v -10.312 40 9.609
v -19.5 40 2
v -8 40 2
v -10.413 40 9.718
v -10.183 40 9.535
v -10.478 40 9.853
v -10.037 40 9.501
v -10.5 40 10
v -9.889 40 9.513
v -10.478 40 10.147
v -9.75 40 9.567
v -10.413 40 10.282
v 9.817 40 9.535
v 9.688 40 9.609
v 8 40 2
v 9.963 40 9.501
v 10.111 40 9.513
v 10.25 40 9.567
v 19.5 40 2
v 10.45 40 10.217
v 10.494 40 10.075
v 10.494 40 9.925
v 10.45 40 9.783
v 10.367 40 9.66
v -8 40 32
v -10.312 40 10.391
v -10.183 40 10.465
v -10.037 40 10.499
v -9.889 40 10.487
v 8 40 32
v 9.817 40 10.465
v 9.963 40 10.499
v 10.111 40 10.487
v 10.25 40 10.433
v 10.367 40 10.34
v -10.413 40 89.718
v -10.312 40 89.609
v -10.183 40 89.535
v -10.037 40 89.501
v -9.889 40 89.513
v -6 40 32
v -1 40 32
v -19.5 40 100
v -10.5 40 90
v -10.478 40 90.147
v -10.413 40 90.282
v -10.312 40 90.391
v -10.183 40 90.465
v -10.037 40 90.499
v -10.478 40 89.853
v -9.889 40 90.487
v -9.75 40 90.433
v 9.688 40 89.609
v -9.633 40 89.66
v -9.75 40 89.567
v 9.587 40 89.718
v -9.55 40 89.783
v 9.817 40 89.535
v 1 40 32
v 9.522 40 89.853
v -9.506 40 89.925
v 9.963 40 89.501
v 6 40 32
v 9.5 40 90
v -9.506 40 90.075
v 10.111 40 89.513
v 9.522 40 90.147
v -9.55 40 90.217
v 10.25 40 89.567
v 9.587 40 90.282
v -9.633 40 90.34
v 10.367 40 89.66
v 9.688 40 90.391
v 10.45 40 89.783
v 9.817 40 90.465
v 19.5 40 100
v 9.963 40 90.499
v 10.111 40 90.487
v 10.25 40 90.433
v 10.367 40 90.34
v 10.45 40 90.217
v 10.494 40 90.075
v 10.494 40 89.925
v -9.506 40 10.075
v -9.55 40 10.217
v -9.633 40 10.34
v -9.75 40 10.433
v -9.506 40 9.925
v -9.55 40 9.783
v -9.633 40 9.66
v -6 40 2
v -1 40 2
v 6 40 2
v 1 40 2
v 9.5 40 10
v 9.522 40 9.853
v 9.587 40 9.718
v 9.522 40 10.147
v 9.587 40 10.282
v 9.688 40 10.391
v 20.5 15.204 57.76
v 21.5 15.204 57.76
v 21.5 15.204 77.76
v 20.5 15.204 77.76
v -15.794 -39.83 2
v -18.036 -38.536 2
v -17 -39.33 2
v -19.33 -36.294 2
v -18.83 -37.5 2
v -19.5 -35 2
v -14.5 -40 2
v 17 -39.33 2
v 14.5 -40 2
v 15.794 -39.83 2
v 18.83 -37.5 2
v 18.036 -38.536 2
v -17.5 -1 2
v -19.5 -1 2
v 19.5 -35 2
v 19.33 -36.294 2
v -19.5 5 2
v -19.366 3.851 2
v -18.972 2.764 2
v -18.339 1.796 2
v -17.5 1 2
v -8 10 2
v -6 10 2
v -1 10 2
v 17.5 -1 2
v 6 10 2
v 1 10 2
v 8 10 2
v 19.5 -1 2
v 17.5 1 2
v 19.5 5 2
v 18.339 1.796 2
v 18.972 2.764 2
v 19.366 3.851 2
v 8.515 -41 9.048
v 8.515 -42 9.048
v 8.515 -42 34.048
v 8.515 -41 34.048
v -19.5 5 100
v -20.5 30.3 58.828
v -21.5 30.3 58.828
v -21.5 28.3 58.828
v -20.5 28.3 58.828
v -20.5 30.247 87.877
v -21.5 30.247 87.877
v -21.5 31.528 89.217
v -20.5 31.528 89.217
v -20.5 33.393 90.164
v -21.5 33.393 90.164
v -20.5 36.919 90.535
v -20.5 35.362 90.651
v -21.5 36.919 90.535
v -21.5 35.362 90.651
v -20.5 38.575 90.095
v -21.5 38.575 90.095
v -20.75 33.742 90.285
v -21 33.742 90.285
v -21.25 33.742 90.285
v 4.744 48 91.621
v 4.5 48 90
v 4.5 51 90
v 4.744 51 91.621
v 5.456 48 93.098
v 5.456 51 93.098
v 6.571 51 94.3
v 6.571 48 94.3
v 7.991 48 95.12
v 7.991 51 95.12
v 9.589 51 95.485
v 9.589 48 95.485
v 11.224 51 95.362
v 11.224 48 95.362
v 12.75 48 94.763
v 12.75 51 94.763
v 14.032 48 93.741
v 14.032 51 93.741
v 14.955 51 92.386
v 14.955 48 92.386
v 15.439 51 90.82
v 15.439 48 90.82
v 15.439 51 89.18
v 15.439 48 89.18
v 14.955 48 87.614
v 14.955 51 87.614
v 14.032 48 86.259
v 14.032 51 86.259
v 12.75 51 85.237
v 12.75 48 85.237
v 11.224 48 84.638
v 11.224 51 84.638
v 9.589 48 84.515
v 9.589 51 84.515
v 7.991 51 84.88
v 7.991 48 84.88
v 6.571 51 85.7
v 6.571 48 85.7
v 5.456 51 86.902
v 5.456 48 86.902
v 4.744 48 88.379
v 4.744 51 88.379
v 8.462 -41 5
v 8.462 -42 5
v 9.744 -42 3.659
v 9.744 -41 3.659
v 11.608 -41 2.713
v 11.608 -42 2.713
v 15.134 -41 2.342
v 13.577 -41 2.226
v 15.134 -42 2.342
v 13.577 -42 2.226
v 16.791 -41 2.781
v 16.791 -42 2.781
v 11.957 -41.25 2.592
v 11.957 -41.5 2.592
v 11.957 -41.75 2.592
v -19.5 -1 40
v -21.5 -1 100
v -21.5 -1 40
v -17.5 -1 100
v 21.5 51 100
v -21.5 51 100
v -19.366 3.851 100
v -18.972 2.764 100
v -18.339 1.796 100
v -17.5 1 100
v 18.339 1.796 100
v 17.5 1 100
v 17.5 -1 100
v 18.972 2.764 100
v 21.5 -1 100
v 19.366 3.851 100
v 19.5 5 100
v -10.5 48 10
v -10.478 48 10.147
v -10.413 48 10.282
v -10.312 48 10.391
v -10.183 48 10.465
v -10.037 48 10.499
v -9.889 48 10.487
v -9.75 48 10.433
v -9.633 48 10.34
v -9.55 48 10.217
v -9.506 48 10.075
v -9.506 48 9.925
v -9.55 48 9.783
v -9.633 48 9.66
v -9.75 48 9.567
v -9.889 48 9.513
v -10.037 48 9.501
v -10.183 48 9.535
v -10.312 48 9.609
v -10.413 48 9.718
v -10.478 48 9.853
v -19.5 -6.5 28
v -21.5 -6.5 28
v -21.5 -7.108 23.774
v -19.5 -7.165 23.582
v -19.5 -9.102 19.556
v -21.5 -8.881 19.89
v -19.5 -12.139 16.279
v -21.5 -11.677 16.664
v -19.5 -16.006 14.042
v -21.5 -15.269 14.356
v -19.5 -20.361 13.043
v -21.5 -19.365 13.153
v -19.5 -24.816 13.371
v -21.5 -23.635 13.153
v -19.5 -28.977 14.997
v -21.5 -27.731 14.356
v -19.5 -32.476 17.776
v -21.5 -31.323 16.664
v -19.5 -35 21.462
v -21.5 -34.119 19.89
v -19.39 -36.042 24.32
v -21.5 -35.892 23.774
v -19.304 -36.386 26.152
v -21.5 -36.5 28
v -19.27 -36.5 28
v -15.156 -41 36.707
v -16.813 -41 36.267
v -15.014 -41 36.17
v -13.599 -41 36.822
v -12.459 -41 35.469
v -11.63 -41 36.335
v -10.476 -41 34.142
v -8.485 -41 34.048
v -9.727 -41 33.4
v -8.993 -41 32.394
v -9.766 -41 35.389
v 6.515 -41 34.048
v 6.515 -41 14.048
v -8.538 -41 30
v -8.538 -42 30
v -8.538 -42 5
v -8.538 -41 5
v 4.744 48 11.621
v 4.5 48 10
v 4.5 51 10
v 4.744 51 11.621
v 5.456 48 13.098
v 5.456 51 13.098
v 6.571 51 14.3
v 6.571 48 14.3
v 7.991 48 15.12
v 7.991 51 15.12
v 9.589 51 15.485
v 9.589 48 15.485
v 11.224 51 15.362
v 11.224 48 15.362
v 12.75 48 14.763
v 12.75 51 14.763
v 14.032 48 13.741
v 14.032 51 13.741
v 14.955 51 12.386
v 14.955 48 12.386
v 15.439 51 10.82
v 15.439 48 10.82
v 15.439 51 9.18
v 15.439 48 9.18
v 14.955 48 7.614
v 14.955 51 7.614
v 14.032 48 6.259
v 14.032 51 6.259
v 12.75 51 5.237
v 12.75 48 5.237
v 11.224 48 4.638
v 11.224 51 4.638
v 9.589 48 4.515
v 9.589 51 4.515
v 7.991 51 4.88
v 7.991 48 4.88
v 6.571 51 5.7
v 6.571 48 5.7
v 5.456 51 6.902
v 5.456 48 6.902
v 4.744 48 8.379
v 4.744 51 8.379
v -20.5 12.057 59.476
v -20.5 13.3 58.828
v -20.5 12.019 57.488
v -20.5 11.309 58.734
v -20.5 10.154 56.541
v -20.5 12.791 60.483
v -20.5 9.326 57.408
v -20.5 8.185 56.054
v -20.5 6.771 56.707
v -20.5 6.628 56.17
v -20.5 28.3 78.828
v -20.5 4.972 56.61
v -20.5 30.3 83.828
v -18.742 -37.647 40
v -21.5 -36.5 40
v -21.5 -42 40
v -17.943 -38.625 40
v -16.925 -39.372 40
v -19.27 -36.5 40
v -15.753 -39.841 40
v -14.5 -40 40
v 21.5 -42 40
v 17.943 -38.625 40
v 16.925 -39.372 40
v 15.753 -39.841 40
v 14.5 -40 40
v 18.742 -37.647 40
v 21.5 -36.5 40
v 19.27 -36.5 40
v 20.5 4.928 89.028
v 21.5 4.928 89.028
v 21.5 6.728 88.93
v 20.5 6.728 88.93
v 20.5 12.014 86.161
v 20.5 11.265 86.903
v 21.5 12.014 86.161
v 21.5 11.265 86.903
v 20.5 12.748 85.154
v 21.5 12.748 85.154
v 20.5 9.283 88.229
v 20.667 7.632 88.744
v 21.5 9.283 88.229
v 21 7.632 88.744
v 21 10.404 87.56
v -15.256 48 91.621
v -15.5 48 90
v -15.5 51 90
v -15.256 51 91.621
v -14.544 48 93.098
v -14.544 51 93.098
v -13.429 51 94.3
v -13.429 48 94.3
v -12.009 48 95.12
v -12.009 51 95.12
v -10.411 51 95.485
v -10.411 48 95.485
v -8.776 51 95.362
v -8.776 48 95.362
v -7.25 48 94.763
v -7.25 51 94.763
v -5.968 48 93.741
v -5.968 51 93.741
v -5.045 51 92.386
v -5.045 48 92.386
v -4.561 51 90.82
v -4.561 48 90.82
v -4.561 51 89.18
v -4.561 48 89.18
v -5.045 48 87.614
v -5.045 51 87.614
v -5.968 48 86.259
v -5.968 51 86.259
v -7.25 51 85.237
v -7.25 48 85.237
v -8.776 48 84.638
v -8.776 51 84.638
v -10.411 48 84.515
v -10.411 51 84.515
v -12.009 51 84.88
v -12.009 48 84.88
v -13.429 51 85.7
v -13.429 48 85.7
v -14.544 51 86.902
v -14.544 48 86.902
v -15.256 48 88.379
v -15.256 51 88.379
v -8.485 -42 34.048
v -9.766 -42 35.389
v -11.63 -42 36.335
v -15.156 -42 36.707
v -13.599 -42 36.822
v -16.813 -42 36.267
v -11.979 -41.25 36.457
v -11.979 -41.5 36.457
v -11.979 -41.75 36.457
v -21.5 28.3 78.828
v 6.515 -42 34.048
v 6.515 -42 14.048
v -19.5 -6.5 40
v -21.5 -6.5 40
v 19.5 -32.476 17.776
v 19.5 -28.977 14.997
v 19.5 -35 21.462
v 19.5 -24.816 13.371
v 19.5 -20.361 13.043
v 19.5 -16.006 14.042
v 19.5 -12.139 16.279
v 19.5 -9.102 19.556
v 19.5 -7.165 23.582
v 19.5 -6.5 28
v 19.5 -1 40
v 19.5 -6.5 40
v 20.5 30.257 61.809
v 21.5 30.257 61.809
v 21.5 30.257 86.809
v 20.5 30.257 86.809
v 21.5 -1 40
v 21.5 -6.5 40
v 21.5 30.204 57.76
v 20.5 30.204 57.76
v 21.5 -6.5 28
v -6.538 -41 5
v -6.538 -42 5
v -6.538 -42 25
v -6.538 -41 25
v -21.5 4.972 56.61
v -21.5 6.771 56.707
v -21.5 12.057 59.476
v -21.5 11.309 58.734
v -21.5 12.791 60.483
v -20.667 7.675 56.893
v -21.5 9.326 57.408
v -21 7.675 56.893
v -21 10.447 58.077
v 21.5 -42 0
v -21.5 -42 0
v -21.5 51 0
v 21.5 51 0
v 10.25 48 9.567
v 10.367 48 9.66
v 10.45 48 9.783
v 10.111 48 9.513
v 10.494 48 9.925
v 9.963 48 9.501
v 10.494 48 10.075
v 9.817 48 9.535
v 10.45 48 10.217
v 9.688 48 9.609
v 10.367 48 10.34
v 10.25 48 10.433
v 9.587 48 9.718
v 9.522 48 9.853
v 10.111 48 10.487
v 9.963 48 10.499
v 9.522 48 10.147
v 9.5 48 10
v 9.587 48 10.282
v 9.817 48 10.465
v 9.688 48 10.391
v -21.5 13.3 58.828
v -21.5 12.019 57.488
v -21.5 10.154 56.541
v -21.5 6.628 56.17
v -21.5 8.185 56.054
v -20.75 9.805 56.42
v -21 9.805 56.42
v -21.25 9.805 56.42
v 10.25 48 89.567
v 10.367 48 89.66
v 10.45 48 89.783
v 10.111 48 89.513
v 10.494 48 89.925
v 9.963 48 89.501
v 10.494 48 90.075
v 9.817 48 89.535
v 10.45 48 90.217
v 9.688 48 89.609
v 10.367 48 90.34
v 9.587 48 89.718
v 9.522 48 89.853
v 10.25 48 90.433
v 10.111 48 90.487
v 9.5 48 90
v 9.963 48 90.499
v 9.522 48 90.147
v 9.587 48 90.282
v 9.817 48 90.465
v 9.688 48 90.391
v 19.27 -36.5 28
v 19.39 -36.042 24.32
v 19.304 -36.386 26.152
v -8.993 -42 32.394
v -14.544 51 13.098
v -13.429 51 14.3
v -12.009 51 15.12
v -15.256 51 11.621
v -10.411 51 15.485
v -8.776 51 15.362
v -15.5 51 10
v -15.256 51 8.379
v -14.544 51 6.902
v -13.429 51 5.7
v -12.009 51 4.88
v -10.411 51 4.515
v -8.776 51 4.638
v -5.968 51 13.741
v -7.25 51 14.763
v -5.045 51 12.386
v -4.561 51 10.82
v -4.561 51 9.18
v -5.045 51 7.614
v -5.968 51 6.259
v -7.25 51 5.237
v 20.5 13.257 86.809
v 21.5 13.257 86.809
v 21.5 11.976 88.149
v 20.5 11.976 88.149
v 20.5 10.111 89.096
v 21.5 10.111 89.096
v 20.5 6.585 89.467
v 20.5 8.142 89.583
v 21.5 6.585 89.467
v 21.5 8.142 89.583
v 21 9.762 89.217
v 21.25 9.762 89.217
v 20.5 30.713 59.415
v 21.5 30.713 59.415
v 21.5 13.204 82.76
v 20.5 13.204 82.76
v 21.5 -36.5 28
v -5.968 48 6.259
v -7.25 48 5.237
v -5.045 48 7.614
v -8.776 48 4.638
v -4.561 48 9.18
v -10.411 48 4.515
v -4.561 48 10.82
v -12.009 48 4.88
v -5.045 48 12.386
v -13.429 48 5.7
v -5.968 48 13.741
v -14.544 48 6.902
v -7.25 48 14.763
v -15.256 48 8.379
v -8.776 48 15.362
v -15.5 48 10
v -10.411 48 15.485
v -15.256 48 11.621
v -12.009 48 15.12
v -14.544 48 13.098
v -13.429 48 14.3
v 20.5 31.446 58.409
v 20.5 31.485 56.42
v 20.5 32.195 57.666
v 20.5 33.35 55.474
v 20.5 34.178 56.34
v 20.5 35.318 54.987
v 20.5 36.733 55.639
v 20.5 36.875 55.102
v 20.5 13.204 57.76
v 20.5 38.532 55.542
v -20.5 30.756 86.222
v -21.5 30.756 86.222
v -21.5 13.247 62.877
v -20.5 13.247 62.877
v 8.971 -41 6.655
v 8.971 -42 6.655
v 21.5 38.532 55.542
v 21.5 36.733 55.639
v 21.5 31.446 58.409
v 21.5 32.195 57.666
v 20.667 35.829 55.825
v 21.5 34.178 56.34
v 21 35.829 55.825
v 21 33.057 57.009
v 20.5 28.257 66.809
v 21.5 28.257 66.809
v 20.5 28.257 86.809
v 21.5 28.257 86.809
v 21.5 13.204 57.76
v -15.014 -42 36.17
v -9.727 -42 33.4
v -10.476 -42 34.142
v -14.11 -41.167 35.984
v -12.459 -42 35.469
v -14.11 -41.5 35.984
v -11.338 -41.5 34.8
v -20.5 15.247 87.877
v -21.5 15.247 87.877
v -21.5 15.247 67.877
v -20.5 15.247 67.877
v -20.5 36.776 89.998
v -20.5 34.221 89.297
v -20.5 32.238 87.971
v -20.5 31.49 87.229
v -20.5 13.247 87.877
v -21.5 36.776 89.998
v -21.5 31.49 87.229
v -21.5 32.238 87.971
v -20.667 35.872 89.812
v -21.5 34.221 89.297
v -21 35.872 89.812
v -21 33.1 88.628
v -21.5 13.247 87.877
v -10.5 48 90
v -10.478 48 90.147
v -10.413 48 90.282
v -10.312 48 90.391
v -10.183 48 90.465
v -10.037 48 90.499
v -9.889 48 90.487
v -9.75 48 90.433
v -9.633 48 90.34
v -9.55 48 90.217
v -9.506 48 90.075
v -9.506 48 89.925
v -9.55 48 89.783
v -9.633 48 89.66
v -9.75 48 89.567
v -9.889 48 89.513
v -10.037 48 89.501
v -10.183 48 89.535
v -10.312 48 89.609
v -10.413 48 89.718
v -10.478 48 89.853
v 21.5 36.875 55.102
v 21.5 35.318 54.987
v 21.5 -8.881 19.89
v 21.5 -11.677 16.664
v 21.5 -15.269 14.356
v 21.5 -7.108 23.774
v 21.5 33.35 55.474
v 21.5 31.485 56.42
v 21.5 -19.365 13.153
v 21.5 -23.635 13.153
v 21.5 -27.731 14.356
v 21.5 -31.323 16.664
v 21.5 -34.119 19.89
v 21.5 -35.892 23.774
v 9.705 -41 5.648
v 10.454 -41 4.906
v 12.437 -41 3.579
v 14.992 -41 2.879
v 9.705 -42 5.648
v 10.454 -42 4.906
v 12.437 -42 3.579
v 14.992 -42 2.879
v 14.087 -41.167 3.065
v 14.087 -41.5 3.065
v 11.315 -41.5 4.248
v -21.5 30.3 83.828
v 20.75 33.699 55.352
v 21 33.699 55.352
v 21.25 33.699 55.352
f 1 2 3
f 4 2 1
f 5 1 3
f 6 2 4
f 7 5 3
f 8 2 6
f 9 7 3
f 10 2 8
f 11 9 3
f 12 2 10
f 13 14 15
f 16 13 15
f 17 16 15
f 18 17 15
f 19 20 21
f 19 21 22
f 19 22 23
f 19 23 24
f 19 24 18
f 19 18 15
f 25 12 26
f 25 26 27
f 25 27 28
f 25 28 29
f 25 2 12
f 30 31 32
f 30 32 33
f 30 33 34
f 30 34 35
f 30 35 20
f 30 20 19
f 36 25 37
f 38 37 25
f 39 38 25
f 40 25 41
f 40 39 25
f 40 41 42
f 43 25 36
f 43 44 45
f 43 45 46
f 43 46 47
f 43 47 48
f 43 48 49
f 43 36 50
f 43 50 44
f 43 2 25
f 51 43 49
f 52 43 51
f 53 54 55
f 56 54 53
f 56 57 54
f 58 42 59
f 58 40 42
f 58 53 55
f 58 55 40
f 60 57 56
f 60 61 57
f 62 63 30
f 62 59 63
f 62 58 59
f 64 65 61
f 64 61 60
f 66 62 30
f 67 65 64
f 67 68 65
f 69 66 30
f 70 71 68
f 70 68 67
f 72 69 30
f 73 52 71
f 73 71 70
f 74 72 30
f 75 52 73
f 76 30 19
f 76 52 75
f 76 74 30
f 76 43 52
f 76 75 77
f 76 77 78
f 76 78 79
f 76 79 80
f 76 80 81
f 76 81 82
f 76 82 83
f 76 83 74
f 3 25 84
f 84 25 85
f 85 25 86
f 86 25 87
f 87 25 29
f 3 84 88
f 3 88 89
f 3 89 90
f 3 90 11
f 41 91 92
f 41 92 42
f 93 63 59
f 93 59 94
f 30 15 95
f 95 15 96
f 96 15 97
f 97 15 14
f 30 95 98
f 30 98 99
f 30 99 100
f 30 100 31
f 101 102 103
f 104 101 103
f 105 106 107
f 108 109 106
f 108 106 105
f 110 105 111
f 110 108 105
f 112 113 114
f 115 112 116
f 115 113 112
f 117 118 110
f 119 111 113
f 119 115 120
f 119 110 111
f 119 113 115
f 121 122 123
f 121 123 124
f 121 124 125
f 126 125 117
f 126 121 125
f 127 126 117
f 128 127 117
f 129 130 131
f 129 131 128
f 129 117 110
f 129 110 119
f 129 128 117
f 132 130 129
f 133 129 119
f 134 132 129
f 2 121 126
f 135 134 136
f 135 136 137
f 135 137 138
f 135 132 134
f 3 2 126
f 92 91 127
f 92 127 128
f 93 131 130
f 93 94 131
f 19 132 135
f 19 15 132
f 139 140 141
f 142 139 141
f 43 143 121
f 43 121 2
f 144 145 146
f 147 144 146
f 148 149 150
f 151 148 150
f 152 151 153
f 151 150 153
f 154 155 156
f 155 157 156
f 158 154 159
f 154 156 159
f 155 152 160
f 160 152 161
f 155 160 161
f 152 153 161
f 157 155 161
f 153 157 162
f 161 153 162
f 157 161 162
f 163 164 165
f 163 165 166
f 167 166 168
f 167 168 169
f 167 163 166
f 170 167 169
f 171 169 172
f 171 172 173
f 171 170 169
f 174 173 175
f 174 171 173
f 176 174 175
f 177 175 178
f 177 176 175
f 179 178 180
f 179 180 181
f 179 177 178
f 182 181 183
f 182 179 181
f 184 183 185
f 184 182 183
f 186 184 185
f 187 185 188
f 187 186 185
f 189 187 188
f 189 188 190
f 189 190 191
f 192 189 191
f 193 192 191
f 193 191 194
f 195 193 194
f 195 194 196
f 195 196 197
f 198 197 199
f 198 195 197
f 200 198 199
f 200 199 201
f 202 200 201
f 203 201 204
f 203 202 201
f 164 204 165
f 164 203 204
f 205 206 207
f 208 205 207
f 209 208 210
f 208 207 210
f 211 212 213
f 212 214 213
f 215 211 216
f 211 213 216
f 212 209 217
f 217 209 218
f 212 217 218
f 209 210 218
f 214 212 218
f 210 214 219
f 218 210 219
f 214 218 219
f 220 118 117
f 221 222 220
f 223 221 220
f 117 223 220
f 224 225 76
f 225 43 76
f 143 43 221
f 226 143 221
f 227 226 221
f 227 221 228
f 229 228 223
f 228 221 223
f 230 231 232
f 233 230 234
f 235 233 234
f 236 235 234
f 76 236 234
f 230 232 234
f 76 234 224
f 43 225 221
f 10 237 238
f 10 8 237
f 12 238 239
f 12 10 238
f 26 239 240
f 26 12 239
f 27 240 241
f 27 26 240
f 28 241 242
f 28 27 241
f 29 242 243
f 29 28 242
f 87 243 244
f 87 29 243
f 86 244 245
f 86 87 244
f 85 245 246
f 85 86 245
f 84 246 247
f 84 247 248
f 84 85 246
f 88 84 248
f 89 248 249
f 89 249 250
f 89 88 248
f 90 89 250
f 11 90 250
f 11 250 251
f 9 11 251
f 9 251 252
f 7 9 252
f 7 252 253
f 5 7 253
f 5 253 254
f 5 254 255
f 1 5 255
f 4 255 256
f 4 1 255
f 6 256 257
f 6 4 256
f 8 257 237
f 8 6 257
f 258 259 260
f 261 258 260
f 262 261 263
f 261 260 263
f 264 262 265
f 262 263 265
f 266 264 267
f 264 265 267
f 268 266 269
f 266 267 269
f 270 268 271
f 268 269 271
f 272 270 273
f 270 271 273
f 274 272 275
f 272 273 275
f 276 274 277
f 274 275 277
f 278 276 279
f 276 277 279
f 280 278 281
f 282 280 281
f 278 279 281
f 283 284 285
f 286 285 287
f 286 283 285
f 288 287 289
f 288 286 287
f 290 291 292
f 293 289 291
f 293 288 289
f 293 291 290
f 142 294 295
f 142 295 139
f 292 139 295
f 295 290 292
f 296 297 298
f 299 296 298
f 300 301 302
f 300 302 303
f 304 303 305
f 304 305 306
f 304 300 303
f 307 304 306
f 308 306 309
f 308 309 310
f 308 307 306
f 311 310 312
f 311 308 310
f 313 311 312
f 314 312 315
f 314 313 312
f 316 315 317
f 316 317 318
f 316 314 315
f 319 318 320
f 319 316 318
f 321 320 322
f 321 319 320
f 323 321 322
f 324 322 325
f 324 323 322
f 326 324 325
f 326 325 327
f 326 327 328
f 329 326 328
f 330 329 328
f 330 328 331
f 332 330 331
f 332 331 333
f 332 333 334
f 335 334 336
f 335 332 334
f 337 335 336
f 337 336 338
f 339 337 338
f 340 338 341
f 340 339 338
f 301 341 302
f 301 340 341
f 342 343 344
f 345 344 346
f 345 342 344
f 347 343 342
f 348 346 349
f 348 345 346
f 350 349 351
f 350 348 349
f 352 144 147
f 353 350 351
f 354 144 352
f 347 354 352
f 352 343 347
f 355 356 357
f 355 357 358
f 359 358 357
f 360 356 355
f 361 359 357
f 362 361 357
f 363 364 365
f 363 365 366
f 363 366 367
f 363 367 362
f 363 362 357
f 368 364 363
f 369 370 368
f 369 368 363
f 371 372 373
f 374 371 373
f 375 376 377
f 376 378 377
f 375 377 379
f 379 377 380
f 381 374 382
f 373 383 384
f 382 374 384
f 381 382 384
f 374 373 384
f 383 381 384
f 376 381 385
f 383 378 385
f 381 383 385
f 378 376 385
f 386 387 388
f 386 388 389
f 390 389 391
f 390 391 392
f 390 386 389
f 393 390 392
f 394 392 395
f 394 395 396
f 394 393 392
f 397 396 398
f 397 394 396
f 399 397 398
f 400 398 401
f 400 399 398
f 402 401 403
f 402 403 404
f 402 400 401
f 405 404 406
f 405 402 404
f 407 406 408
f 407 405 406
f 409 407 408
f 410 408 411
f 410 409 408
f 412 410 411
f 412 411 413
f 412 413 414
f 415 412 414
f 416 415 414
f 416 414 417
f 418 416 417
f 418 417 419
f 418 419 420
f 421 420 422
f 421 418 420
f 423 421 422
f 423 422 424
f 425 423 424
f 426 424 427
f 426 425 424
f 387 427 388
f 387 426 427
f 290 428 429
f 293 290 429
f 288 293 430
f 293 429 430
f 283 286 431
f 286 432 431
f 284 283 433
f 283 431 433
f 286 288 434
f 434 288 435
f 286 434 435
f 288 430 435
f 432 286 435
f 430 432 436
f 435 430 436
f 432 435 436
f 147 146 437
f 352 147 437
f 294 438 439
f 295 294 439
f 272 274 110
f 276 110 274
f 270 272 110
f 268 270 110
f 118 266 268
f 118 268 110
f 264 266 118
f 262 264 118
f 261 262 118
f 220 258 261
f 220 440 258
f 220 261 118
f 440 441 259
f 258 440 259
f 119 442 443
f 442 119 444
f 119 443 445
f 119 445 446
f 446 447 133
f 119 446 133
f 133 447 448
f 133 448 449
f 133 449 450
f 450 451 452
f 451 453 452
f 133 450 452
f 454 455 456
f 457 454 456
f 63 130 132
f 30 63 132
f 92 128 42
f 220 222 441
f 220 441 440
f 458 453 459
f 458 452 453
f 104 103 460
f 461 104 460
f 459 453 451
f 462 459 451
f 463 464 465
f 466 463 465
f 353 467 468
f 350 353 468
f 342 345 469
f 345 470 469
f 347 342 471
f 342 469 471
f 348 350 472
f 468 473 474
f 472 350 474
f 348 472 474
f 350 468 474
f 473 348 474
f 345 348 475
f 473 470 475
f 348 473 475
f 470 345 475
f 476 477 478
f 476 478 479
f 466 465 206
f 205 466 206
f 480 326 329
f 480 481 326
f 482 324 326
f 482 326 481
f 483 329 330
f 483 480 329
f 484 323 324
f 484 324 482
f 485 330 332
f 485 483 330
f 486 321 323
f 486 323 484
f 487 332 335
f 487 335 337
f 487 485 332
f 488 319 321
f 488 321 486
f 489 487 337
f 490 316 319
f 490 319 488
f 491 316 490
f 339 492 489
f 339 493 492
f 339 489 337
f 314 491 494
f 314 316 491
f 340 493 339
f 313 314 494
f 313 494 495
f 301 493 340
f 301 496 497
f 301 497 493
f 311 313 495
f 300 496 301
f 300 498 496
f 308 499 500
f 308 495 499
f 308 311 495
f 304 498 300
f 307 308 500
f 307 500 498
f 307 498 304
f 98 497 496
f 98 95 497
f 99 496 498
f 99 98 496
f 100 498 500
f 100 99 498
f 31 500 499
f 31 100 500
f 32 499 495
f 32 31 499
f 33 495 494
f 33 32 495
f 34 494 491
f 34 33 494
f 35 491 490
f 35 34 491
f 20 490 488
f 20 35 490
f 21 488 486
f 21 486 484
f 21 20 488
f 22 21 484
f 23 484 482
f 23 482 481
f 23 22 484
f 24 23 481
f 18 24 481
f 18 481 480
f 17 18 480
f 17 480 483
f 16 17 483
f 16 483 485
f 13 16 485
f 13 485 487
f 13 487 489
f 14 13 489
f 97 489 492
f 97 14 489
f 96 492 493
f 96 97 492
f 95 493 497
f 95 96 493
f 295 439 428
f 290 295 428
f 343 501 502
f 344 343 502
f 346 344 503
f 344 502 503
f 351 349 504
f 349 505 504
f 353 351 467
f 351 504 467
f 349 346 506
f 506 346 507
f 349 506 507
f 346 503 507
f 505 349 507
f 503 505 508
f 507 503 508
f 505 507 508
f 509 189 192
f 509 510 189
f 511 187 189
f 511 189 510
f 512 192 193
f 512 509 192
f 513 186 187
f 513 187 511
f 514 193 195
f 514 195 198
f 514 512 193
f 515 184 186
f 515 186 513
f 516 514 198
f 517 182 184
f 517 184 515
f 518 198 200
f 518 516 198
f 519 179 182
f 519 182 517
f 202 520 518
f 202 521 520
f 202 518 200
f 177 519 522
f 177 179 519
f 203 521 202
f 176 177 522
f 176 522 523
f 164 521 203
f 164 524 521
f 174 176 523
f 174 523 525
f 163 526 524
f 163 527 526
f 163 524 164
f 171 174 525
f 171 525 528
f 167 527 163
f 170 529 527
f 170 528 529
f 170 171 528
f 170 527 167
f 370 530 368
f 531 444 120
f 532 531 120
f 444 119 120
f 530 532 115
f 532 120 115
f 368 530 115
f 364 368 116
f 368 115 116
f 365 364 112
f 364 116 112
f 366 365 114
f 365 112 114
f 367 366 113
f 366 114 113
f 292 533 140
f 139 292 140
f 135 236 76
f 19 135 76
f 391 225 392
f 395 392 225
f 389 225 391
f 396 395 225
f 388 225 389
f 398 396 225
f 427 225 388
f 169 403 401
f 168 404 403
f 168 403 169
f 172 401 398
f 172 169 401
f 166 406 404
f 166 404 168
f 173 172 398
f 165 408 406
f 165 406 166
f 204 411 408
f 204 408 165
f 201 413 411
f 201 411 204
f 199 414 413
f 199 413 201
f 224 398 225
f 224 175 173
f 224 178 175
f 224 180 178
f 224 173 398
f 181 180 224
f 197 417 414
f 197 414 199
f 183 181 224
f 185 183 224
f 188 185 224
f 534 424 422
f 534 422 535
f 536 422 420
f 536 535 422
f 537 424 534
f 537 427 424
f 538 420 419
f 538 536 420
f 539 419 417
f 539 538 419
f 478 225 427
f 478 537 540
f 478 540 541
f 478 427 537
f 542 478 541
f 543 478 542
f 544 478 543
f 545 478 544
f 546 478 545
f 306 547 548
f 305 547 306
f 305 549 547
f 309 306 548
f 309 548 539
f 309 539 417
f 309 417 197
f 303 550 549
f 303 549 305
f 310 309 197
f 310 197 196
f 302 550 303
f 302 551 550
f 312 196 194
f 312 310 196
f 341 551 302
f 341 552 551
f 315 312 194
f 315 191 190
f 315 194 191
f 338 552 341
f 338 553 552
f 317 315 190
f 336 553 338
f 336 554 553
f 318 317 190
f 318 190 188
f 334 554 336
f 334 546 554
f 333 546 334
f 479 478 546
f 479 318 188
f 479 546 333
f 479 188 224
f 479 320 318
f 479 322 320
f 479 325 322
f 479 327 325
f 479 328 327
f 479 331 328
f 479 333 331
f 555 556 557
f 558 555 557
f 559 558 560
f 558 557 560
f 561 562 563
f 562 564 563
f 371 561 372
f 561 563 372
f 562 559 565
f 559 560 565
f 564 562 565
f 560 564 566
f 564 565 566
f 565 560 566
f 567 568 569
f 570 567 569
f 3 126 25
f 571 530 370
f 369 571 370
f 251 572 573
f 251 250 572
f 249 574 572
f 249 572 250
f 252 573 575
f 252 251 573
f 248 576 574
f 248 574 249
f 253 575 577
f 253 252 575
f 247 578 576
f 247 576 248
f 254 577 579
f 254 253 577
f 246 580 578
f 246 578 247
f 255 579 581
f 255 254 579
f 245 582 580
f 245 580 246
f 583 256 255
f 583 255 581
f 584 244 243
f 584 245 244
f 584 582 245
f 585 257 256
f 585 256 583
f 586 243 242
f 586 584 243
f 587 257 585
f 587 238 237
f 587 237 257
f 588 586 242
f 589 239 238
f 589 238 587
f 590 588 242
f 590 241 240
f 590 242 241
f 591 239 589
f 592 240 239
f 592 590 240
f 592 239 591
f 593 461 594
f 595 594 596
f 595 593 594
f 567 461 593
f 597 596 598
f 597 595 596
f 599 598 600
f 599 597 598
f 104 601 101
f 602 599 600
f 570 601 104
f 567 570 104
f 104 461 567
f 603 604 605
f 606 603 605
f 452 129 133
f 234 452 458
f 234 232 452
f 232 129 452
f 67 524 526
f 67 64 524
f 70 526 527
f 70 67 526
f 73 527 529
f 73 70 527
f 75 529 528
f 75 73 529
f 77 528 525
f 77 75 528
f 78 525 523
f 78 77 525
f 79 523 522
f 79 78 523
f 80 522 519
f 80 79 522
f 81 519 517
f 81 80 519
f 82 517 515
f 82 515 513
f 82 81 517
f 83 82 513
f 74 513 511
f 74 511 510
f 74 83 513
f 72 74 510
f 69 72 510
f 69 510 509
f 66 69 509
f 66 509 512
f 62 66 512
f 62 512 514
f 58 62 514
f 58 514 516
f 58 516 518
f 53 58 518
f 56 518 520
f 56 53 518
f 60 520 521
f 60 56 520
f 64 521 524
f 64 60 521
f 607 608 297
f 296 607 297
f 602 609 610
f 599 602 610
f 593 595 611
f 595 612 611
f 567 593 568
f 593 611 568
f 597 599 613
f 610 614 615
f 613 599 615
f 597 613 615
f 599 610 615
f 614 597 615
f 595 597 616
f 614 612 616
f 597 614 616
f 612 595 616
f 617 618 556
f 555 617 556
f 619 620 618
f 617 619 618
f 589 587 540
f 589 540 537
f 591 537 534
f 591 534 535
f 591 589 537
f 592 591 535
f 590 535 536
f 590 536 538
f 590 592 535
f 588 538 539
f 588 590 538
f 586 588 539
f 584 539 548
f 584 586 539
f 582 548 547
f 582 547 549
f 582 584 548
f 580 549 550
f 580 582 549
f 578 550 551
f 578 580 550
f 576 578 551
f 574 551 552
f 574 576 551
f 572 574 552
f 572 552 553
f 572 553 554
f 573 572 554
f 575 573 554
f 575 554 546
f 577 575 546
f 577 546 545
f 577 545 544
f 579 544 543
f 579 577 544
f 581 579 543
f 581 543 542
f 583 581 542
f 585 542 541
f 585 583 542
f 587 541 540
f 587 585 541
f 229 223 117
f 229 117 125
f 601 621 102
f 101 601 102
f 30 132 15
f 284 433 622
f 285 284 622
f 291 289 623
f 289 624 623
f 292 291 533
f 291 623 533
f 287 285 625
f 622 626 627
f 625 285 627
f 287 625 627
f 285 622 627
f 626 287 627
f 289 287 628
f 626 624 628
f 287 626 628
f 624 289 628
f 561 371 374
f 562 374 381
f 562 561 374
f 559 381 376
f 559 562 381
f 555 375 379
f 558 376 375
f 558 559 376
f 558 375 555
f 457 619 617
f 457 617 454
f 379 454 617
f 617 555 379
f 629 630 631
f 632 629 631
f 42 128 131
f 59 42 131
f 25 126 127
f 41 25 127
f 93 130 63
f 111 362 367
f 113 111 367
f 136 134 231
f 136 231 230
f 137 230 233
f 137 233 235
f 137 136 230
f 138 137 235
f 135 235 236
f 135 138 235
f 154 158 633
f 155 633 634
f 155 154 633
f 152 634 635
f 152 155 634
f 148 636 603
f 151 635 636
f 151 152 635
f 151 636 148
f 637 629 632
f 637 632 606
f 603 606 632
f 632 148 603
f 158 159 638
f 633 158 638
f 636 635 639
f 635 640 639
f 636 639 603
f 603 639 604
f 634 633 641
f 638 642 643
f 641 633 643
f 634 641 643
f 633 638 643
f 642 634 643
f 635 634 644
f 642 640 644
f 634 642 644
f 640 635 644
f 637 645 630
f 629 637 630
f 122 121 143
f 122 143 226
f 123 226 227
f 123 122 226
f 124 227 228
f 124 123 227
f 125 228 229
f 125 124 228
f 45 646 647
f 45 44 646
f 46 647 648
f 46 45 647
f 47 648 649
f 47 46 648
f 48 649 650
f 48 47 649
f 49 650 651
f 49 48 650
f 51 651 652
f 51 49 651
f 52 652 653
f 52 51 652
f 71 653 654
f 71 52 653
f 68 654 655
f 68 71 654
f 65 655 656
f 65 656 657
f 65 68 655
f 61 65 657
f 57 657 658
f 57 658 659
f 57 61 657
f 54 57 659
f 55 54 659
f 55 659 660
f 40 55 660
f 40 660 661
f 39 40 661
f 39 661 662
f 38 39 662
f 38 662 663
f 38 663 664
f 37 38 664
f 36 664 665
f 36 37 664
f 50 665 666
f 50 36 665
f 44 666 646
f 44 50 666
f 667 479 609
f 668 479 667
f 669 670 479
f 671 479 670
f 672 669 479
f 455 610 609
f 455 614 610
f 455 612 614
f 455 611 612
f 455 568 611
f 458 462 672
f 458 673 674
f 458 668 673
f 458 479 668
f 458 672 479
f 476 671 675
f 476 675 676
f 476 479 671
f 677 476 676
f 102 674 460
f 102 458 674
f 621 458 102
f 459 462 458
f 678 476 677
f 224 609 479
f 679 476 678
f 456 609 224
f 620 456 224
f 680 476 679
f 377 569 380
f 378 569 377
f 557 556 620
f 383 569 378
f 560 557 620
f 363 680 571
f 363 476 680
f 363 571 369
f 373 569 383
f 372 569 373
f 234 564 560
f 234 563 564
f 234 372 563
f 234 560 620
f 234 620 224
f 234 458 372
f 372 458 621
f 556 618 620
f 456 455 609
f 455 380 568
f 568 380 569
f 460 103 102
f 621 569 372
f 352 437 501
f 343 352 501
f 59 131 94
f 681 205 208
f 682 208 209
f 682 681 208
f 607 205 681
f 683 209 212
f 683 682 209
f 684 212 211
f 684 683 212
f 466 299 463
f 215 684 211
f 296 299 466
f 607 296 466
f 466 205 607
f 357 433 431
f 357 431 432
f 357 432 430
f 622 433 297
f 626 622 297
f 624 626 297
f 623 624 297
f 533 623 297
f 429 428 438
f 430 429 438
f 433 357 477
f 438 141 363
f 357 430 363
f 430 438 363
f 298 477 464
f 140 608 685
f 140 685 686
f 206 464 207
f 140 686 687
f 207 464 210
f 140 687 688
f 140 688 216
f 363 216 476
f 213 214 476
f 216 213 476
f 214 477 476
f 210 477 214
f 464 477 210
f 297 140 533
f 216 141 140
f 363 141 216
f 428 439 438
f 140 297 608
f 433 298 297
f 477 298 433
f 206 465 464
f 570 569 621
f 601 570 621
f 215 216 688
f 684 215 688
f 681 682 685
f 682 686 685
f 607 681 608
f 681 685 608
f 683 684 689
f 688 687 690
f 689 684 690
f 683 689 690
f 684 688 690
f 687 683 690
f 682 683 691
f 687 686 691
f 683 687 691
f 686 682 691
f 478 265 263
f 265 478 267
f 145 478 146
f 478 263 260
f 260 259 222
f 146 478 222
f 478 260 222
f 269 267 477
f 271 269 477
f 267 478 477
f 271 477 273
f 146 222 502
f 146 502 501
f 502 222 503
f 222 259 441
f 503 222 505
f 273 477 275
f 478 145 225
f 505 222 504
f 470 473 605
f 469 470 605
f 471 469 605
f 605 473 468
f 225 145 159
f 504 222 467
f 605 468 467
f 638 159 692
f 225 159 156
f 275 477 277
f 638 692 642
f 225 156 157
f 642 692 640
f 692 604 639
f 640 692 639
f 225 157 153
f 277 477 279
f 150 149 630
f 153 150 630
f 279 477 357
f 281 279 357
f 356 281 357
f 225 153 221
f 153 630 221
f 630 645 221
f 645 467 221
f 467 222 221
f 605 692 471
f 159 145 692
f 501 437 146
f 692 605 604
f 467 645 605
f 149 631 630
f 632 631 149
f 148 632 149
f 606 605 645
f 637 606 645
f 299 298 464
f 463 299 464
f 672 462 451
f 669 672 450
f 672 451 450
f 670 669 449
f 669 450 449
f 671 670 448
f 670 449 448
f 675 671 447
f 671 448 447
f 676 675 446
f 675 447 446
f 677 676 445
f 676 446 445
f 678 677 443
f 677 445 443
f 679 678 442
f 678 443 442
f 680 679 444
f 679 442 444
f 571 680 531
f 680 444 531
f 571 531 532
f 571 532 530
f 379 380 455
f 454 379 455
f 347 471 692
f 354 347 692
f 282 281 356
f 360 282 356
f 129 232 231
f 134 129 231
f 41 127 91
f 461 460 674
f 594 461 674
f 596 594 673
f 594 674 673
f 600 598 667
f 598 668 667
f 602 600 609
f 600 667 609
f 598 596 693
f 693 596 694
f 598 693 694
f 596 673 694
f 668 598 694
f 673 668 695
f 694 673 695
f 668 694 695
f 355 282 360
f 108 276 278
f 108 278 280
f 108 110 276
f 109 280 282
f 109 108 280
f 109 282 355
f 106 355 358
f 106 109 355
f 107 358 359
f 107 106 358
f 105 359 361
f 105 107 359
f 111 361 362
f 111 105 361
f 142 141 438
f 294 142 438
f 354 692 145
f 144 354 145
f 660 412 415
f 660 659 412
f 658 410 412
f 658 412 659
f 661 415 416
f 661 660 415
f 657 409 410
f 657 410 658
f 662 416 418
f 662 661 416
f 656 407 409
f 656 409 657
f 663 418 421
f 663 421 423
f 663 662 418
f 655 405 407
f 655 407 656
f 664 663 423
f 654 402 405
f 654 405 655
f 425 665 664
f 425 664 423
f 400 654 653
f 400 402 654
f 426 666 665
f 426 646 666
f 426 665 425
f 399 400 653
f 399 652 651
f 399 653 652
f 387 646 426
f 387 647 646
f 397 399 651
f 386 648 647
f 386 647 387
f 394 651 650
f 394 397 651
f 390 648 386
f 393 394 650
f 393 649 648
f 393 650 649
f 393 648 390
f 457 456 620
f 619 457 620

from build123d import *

# Parameters (mm, degrees)
F0_W         = 43
F0_H         = 84
F1_DEPTH     = 100
F2_W         = 43
F2_H         = 41
F3_DEPTH     = 60
F4_W         = 39
F4_H         = 39
F5_DEPTH     = 38
F6_W         = 39
F6_H         = 39
F7_DEPTH     = 98
F8_W         = 35
F8_H         = 2
F9_DEPTH     = 98
F10_T1_DEPTH = 98
F12_DEPTH    = 43
F13_R        = 5
F14_DEPTH    = 3
F15_R        = 5.5
F16_DEPTH    = 3
F17_W        = 2
F17_H        = 30
F18_DEPTH    = 30
F19_SIZE     = 29.99999
F21_DEPTH    = 1
F23_DEPTH    = 1
F25_DEPTH    = 1
F26_R        = 0.5
F27_DEPTH    = 2
F28_R        = 0.5
F29_DEPTH    = 2
F30_DEPTH    = 6
F31_DEPTH    = 6
F32_DEPTH    = 6
F33_R        = 0.5
F34_DEPTH    = 2
F35_R        = 0.5
F36_DEPTH    = 2
F37_DEPTH    = 6
F38_DEPTH    = 6


# Not quite as in the source:
# - a fillet or chamfer that OpenCascade refuses, or shapes differently, is made with other operations: its cross-section is extruded or revolved along the edge and cut away or added
# - a fillet or chamfer is up to 0.001 mm smaller than in the source, because OpenCascade refuses the exact size


with BuildPart() as f1:
    # F0 (on Top) → F1 (new body)
    with BuildSketch(Plane.XY):
        Rectangle(F0_W, F0_H)
    extrude(amount=F1_DEPTH)

    # F2 (on face) → F3 (cut)
    with BuildSketch(Plane.XY.offset(100)):
        with Locations((0, -21.5)):
            Rectangle(F2_W, F2_H)
    extrude(amount=-F3_DEPTH, mode=Mode.SUBTRACT)

    # F4 (on face) → F5 (cut)
    with BuildSketch(Plane.XY.offset(40)):
        with Locations((0, -20.5)):
            Rectangle(F4_W, F4_H)
    extrude(amount=-F5_DEPTH, mode=Mode.SUBTRACT)

    # F6 (on face) → F7 (cut)
    with BuildSketch(Plane.XY.offset(100)):
        with Locations((0, 20.5)):
            Rectangle(F6_W, F6_H)
    extrude(amount=-F7_DEPTH, mode=Mode.SUBTRACT)

    # F8 (on face) → F9 (cut)
    with BuildSketch(Plane.XY.offset(100)):
        Rectangle(F8_W, F8_H)
    extrude(amount=-F9_DEPTH, mode=Mode.SUBTRACT)

    # F10: fillet of radius 5 on 2 edges, made by hand

    # F10_s2 → F10_t1 (join)
    with BuildSketch(Plane.XY.offset(2)):
        with BuildLine():
            ThreePointArc((-19.5, 5), (-18.972135955, 2.7639320225), (-17.5, 1))
            Line((-17.5, 1), (-19.5, 1))
            Line((-19.5, 1), (-19.5, 5))
        make_face()
        with BuildLine():
            ThreePointArc((17.5, 1), (18.972135955, 2.7639320225), (19.5, 5))
            Line((19.5, 5), (19.5, 1))
            Line((19.5, 1), (17.5, 1))
        make_face()
    extrude(amount=F10_T1_DEPTH)

    # F11 (on face) → F12 (cut)
    with BuildSketch(Plane(origin=(-21.5, 0, 0), x_dir=(0, -1, 0), z_dir=(-1, 0, 0))):
        with BuildLine():
            Line((6.5, 40), (6.5, 28))
            ThreePointArc((6.5, 28), (21.5, 13), (36.5, 28))
            Line((36.5, 28), (36.5, 40))
            Line((36.5, 40), (6.5, 40))
        make_face()
    extrude(amount=-F12_DEPTH, mode=Mode.SUBTRACT)

    # F13
    f13_edges = [f1.edges().sort_by_distance(p)[0] for p in [
        (-19.5, -40, 21),
        (19.5, -40, 21),
    ]]
    fillet(f13_edges, radius=F13_R)

    # F14 (add): a face of the model
    f14_faces = [f1.faces().sort_by_distance(p)[0] for p in [
        (0, 42, 50),
    ]]
    extrude(f14_faces, amount=F14_DEPTH)

    # F15 (on face) → F16 (cut)
    with BuildSketch(Plane(origin=(0, 45, 0), x_dir=(-1, 0, 0), z_dir=(0, 1, 0))):
        with Locations((10, 90)):
            Circle(F15_R)
        with Locations((-10, 90)):
            Circle(F15_R)
        with Locations((-10, 10)):
            Circle(F15_R)
        with Locations((10, 10)):
            Circle(F15_R)
    extrude(amount=-F16_DEPTH, mode=Mode.SUBTRACT)

    # F17 (on face) → F18 (join)
    with BuildSketch(Plane.XY.offset(2)):
        with Locations((0, 25)):
            Rectangle(F17_W, F17_H)
        with Locations((7, 25)):
            Rectangle(F17_W, F17_H)
        with Locations((-7, 25)):
            Rectangle(F17_W, F17_H)
    extrude(amount=F18_DEPTH)

    # F19 (size 30 in the source; OpenCascade refuses exactly that, so slightly less here)
    f19_edges = [f1.edges().sort_by_distance(p)[0] for p in [
        (-7, 10, 32),
        (0, 10, 32),
        (7, 10, 32),
    ]]
    chamfer(f19_edges, length=F19_SIZE)

    # F20 (on face) → F21 (cut)
    with BuildSketch(Plane.YZ.offset(21.5)):
        with BuildLine():
            Line((30.7126875989, 59.4153521478), (13.203869056, 82.7604435384))
            Line((13.203869056, 82.7604435384), (13.203869056, 57.7604435384))
            Line((13.203869056, 57.7604435384), (15.203869056, 57.7604435384))
            Line((15.203869056, 57.7604435384), (15.203869056, 77.7604435384))
            Line((15.203869056, 77.7604435384), (30.203869056, 57.7604435384))
            add(Edge.make_bspline(
                [(30.203869056, 57.7604435384), (30.5911530821, 57.276545428), (31.4156642738, 56.2463469671), (33.7048595404, 55.2813534719), (35.8930037718, 54.7622938939), (37.6230920038, 55.2732884025), (38.5322710667, 55.5418212437)],
                knots=[0, 0, 0, 0, 0.2269766379, 0.4832235918, 0.7284287114, 1, 1, 1, 1], degree=3))
            add(Edge.make_bspline(
                [(38.5322710667, 55.5418212437), (38.1831508623, 55.5237925594), (37.4110779588, 55.4839224558), (35.8091615291, 55.8243371923), (34.4178365647, 56.1496791023), (33.0309594623, 56.9804929726), (31.5764378105, 58.1302638948), (30.9915396307, 59.0004758727), (30.7126875989, 59.4153521478)],
                knots=[0, 0, 0, 0, 0.1423640494, 0.3148354738, 0.477082541, 0.6483059214, 0.8323287509, 1, 1, 1, 1], degree=3))
        make_face()
        with BuildLine():
            Line((12.7480653018, 85.1540187478), (30.2568838447, 61.8089273572))
            Line((30.2568838447, 61.8089273572), (30.2568838447, 86.8089273572))
            Line((30.2568838447, 86.8089273572), (28.2568838447, 86.8089273572))
            Line((28.2568838447, 86.8089273572), (28.2568838447, 66.8089273572))
            Line((28.2568838447, 66.8089273572), (13.2568838447, 86.8089273572))
            add(Edge.make_bspline(
                [(13.2568838447, 86.8089273572), (12.8695998186, 87.2928254676), (12.0450886269, 88.3230239285), (9.7558933603, 89.2880174237), (7.5677491289, 89.8070770017), (5.8376608969, 89.2960824931), (4.928481834, 89.0275496519)],
                knots=[0, 0, 0, 0, 0.2269766379, 0.4832235918, 0.7284287114, 1, 1, 1, 1], degree=3))
            add(Edge.make_bspline(
                [(4.928481834, 89.0275496519), (5.2776020384, 89.0455783363), (6.0496749419, 89.0854484398), (7.6515913716, 88.7450337033), (9.042916336, 88.4196917933), (10.4297934384, 87.5888779231), (11.8843150902, 86.4391070008), (12.46921327, 85.5688950229), (12.7480653018, 85.1540187478)],
                knots=[0, 0, 0, 0, 0.1423640494, 0.3148354738, 0.477082541, 0.6483059214, 0.8323287509, 1, 1, 1, 1], degree=3))
        make_face()
    extrude(amount=-F21_DEPTH, mode=Mode.SUBTRACT)

    # F22 (on face) → F23 (cut)
    with BuildSketch(Plane(origin=(-21.5, 0, 0), x_dir=(0, -1, 0), z_dir=(-1, 0, 0))):
        with BuildLine():
            Line((-12.7911877275, 60.483143282), (-30.3000062704, 83.8282346725))
            Line((-30.3000062704, 83.8282346725), (-30.3000062704, 58.8282346725))
            Line((-30.3000062704, 58.8282346725), (-28.3000062704, 58.8282346725))
            Line((-28.3000062704, 58.8282346725), (-28.3000062704, 78.8282346725))
            Line((-28.3000062704, 78.8282346725), (-13.3000062704, 58.8282346725))
            add(Edge.make_bspline(
                [(-13.3000062704, 58.8282346725), (-12.9127222442, 58.3443365621), (-12.0882110526, 57.3141381012), (-9.799015786, 56.349144606), (-7.6108715546, 55.830085028), (-5.8807833225, 56.3410795367), (-4.9716042597, 56.6096123778)],
                knots=[0, 0, 0, 0, 0.2269766379, 0.4832235918, 0.7284287114, 1, 1, 1, 1], degree=3))
            add(Edge.make_bspline(
                [(-4.9716042597, 56.6096123778), (-5.320724464, 56.5915836935), (-6.0927973675, 56.5517135899), (-7.6947137972, 56.8921283264), (-9.0860387617, 57.2174702364), (-10.4729158641, 58.0482841067), (-11.9274375159, 59.1980550289), (-12.5123356957, 60.0682670068), (-12.7911877275, 60.483143282)],
                knots=[0, 0, 0, 0, 0.1423640494, 0.3148354738, 0.477082541, 0.6483059214, 0.8323287509, 1, 1, 1, 1], degree=3))
        make_face()
        with BuildLine():
            Line((-30.7558100246, 86.2218098819), (-13.2469914816, 62.8767184913))
            Line((-13.2469914816, 62.8767184913), (-13.2469914816, 87.8767184913))
            Line((-13.2469914816, 87.8767184913), (-15.2469914816, 87.8767184913))
            Line((-15.2469914816, 87.8767184913), (-15.2469914816, 67.8767184913))
            Line((-15.2469914816, 67.8767184913), (-30.2469914816, 87.8767184913))
            add(Edge.make_bspline(
                [(-30.2469914816, 87.8767184913), (-30.6342755078, 88.3606166017), (-31.4587866995, 89.3908150626), (-33.747981966, 90.3558085578), (-35.9361261975, 90.8748681358), (-37.6662144295, 90.3638736272), (-38.5753934924, 90.095340786)],
                knots=[0, 0, 0, 0, 0.2269766379, 0.4832235918, 0.7284287114, 1, 1, 1, 1], degree=3))
            add(Edge.make_bspline(
                [(-38.5753934924, 90.095340786), (-38.226273288, 90.1133694704), (-37.4542003845, 90.1532395739), (-35.8522839548, 89.8128248375), (-34.4609589904, 89.4874829274), (-33.074081888, 88.6566690572), (-31.6195602362, 87.5068981349), (-31.0346620564, 86.636686157), (-30.7558100246, 86.2218098819)],
                knots=[0, 0, 0, 0, 0.1423640494, 0.3148354738, 0.477082541, 0.6483059214, 0.8323287509, 1, 1, 1, 1], degree=3))
        make_face()
    extrude(amount=-F23_DEPTH, mode=Mode.SUBTRACT)

    # F24 (on face) → F25 (cut)
    with BuildSketch(Plane.XZ.offset(42)):
        with BuildLine():
            Line((8.9712467361, 6.654908032), (-8.5375718068, 29.9999994226))
            Line((-8.5375718068, 29.9999994226), (-8.5375718068, 4.9999994226))
            Line((-8.5375718068, 4.9999994226), (-6.5375718068, 4.9999994226))
            Line((-6.5375718068, 4.9999994226), (-6.5375718068, 24.9999994226))
            Line((-6.5375718068, 24.9999994226), (8.4624281932, 4.9999994226))
            add(Edge.make_bspline(
                [(8.4624281932, 4.9999994226), (8.8497122193, 4.5161013121), (9.674223411, 3.4859028513), (11.9634186776, 2.5209093561), (14.151562909, 2.0018497781), (15.8816511411, 2.5128442867), (16.7908302039, 2.7813771279)],
                knots=[0, 0, 0, 0, 0.2269766379, 0.4832235918, 0.7284287114, 1, 1, 1, 1], degree=3))
            add(Edge.make_bspline(
                [(16.7908302039, 2.7813771279), (16.4417099996, 2.7633484435), (15.669637096, 2.72347834), (14.0677206663, 3.0638930764), (12.6763957019, 3.3892349865), (11.2895185995, 4.2200488567), (9.8349969477, 5.369819779), (9.2500987679, 6.2400317569), (8.9712467361, 6.654908032)],
                knots=[0, 0, 0, 0, 0.1423640494, 0.3148354738, 0.477082541, 0.6483059214, 0.8323287509, 1, 1, 1, 1], degree=3))
        make_face()
        with BuildLine():
            Line((-8.993375561, 32.3935746319), (8.515442982, 9.0484832413))
            Line((8.515442982, 9.0484832413), (8.515442982, 34.0484832413))
            Line((8.515442982, 34.0484832413), (6.515442982, 34.0484832413))
            Line((6.515442982, 34.0484832413), (6.515442982, 14.0484832413))
            Line((6.515442982, 14.0484832413), (-8.484557018, 34.0484832413))
            add(Edge.make_bspline(
                [(-8.484557018, 34.0484832413), (-8.8718410442, 34.5323813518), (-9.6963522359, 35.5625798127), (-11.9855475024, 36.5275733078), (-14.1736917339, 37.0466328859), (-15.9037799659, 36.5356383772), (-16.8129590288, 36.267105536)],
                knots=[0, 0, 0, 0, 0.2269766379, 0.4832235918, 0.7284287114, 1, 1, 1, 1], degree=3))
            add(Edge.make_bspline(
                [(-16.8129590288, 36.267105536), (-16.4638388244, 36.2851342204), (-15.6917659209, 36.325004324), (-14.0898494912, 35.9845895875), (-12.6985245268, 35.6592476775), (-11.3116474244, 34.8284338072), (-9.8571257726, 33.678662885), (-9.2722275928, 32.808450907), (-8.993375561, 32.3935746319)],
                knots=[0, 0, 0, 0, 0.1423640494, 0.3148354738, 0.477082541, 0.6483059214, 0.8323287509, 1, 1, 1, 1], degree=3))
        make_face()
    extrude(amount=-F25_DEPTH, mode=Mode.SUBTRACT)

    # F26 (on face) → F27 (cut)
    with BuildSketch(Plane(origin=(0, 42, 0), x_dir=(-1, 0, 0), z_dir=(0, 1, 0))):
        with Locations((-10, 90)):
            Circle(F26_R)
    extrude(amount=-F27_DEPTH, mode=Mode.SUBTRACT)

    # F28 (on face) → F29 (cut)
    with BuildSketch(Plane(origin=(0, 42, 0), x_dir=(-1, 0, 0), z_dir=(0, 1, 0))):
        with Locations((10, 90)):
            Circle(F28_R)
    extrude(amount=-F29_DEPTH, mode=Mode.SUBTRACT)

    # F30 (add): a face of the model
    f30_faces = [f1.faces().sort_by_distance(p)[0] for p in [
        (0, 45, 50),
    ]]
    extrude(f30_faces, amount=F30_DEPTH)

    # F31 (add): a face of the model
    f31_faces = [f1.faces().sort_by_distance(p)[0] for p in [
        (15.3444365081, 42, 90),
    ]]
    extrude(f31_faces, amount=F31_DEPTH)

    # F32 (add): a face of the model
    f32_faces = [f1.faces().sort_by_distance(p)[0] for p in [
        (-4.6555634919, 42, 90),
    ]]
    extrude(f32_faces, amount=F32_DEPTH)

    # F33 (on face) → F34 (cut)
    with BuildSketch(Plane(origin=(0, 42, 0), x_dir=(-1, 0, 0), z_dir=(0, 1, 0))):
        with Locations((-10, 10)):
            Circle(F33_R)
    extrude(amount=-F34_DEPTH, mode=Mode.SUBTRACT)

    # F35 (on face) → F36 (cut)
    with BuildSketch(Plane(origin=(0, 42, 0), x_dir=(-1, 0, 0), z_dir=(0, 1, 0))):
        with Locations((10, 10)):
            Circle(F35_R)
    extrude(amount=-F36_DEPTH, mode=Mode.SUBTRACT)

    # F37 (add): a face of the model
    f37_faces = [f1.faces().sort_by_distance(p)[0] for p in [
        (15.3444365081, 42, 10),
    ]]
    extrude(f37_faces, amount=F37_DEPTH)

    # F38 (add): a face of the model
    f38_faces = [f1.faces().sort_by_distance(p)[0] for p in [
        (-4.6555634919, 42, 10),
    ]]
    extrude(f38_faces, amount=F38_DEPTH)


solid = f1.part
